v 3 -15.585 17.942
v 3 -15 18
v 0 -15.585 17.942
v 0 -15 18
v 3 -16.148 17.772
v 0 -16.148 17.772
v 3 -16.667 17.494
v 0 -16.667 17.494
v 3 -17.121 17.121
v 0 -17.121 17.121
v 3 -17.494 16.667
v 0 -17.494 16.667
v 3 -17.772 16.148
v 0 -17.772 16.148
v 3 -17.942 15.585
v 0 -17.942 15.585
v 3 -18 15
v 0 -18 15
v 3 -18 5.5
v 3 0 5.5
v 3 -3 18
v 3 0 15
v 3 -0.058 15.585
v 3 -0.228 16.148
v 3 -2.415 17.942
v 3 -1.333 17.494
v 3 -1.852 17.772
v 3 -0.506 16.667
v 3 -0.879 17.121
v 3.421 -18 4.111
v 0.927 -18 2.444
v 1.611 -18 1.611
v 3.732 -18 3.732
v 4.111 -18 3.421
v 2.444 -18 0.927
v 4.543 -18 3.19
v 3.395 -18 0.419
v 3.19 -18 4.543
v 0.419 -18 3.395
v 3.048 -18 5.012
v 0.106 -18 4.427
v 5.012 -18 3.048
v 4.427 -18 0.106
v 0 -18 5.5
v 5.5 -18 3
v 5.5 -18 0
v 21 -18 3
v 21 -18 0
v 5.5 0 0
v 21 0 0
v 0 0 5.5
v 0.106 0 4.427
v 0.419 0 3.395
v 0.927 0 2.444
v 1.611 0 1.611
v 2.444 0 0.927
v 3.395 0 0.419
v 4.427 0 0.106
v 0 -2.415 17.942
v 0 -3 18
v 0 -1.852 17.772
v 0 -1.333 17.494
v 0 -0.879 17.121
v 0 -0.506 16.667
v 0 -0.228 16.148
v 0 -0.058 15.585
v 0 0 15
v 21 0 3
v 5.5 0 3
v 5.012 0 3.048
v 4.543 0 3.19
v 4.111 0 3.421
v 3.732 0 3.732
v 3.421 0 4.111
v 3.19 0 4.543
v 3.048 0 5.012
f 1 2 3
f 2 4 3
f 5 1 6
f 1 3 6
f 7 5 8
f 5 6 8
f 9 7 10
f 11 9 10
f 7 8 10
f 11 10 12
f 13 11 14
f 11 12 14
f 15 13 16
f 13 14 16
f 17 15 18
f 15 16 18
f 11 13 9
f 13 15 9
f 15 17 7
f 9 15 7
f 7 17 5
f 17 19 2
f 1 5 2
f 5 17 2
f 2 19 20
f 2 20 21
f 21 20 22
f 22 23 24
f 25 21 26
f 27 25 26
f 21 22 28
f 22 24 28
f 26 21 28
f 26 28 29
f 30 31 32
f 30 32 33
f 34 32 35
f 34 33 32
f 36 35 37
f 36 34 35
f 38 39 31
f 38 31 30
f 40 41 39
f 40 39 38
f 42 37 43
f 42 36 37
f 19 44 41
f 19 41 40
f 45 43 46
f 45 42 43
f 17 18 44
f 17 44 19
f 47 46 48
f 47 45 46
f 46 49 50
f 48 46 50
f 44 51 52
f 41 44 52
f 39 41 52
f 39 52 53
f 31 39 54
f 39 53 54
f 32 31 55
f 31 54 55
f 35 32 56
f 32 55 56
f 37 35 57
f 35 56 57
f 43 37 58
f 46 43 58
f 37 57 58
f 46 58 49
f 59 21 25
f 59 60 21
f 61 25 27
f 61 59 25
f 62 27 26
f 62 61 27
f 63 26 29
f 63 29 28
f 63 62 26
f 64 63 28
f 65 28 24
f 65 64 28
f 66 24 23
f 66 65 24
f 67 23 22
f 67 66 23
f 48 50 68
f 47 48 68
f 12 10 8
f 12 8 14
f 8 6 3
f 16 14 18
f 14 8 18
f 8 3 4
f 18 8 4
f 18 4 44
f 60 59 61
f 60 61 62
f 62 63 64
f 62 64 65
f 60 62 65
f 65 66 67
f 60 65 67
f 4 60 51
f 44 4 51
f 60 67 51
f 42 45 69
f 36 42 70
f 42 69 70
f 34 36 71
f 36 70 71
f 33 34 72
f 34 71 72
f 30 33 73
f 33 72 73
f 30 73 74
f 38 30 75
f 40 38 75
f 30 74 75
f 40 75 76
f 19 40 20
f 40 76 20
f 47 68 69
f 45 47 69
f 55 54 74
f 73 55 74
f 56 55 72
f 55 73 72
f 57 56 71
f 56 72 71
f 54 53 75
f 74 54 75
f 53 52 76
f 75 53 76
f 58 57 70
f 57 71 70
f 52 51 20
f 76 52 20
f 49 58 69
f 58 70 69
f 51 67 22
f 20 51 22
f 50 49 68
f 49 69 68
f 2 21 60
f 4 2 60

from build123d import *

# Parameters (mm, degrees)
F1_DEPTH = 18
F2_R     = 3


with BuildPart() as f1:
    # F0 (on Front) → F1 (new body)
    with BuildSketch(Plane.XZ):
        with BuildLine():
            ThreePointArc((0, 5.5), (1.610913, 1.610913), (5.5, 0))
            Line((5.5, 0), (21, 0))
            Line((21, 0), (21, 3))
            Line((21, 3), (5.5, 3))
            ThreePointArc((5.5, 3), (3.732233, 3.732233), (3, 5.5))
            Line((3, 5.5), (3, 18))
            Line((3, 18), (0, 18))
            Line((0, 18), (0, 5.5))
        make_face()
    extrude(amount=F1_DEPTH)

    # F2
    f2_edges = [f1.edges().sort_by_distance(p)[0] for p in [
        (1.5, -18, 18),
        (1.5, 0, 18),
    ]]
    fillet(f2_edges, radius=F2_R)


solid = f1.part
